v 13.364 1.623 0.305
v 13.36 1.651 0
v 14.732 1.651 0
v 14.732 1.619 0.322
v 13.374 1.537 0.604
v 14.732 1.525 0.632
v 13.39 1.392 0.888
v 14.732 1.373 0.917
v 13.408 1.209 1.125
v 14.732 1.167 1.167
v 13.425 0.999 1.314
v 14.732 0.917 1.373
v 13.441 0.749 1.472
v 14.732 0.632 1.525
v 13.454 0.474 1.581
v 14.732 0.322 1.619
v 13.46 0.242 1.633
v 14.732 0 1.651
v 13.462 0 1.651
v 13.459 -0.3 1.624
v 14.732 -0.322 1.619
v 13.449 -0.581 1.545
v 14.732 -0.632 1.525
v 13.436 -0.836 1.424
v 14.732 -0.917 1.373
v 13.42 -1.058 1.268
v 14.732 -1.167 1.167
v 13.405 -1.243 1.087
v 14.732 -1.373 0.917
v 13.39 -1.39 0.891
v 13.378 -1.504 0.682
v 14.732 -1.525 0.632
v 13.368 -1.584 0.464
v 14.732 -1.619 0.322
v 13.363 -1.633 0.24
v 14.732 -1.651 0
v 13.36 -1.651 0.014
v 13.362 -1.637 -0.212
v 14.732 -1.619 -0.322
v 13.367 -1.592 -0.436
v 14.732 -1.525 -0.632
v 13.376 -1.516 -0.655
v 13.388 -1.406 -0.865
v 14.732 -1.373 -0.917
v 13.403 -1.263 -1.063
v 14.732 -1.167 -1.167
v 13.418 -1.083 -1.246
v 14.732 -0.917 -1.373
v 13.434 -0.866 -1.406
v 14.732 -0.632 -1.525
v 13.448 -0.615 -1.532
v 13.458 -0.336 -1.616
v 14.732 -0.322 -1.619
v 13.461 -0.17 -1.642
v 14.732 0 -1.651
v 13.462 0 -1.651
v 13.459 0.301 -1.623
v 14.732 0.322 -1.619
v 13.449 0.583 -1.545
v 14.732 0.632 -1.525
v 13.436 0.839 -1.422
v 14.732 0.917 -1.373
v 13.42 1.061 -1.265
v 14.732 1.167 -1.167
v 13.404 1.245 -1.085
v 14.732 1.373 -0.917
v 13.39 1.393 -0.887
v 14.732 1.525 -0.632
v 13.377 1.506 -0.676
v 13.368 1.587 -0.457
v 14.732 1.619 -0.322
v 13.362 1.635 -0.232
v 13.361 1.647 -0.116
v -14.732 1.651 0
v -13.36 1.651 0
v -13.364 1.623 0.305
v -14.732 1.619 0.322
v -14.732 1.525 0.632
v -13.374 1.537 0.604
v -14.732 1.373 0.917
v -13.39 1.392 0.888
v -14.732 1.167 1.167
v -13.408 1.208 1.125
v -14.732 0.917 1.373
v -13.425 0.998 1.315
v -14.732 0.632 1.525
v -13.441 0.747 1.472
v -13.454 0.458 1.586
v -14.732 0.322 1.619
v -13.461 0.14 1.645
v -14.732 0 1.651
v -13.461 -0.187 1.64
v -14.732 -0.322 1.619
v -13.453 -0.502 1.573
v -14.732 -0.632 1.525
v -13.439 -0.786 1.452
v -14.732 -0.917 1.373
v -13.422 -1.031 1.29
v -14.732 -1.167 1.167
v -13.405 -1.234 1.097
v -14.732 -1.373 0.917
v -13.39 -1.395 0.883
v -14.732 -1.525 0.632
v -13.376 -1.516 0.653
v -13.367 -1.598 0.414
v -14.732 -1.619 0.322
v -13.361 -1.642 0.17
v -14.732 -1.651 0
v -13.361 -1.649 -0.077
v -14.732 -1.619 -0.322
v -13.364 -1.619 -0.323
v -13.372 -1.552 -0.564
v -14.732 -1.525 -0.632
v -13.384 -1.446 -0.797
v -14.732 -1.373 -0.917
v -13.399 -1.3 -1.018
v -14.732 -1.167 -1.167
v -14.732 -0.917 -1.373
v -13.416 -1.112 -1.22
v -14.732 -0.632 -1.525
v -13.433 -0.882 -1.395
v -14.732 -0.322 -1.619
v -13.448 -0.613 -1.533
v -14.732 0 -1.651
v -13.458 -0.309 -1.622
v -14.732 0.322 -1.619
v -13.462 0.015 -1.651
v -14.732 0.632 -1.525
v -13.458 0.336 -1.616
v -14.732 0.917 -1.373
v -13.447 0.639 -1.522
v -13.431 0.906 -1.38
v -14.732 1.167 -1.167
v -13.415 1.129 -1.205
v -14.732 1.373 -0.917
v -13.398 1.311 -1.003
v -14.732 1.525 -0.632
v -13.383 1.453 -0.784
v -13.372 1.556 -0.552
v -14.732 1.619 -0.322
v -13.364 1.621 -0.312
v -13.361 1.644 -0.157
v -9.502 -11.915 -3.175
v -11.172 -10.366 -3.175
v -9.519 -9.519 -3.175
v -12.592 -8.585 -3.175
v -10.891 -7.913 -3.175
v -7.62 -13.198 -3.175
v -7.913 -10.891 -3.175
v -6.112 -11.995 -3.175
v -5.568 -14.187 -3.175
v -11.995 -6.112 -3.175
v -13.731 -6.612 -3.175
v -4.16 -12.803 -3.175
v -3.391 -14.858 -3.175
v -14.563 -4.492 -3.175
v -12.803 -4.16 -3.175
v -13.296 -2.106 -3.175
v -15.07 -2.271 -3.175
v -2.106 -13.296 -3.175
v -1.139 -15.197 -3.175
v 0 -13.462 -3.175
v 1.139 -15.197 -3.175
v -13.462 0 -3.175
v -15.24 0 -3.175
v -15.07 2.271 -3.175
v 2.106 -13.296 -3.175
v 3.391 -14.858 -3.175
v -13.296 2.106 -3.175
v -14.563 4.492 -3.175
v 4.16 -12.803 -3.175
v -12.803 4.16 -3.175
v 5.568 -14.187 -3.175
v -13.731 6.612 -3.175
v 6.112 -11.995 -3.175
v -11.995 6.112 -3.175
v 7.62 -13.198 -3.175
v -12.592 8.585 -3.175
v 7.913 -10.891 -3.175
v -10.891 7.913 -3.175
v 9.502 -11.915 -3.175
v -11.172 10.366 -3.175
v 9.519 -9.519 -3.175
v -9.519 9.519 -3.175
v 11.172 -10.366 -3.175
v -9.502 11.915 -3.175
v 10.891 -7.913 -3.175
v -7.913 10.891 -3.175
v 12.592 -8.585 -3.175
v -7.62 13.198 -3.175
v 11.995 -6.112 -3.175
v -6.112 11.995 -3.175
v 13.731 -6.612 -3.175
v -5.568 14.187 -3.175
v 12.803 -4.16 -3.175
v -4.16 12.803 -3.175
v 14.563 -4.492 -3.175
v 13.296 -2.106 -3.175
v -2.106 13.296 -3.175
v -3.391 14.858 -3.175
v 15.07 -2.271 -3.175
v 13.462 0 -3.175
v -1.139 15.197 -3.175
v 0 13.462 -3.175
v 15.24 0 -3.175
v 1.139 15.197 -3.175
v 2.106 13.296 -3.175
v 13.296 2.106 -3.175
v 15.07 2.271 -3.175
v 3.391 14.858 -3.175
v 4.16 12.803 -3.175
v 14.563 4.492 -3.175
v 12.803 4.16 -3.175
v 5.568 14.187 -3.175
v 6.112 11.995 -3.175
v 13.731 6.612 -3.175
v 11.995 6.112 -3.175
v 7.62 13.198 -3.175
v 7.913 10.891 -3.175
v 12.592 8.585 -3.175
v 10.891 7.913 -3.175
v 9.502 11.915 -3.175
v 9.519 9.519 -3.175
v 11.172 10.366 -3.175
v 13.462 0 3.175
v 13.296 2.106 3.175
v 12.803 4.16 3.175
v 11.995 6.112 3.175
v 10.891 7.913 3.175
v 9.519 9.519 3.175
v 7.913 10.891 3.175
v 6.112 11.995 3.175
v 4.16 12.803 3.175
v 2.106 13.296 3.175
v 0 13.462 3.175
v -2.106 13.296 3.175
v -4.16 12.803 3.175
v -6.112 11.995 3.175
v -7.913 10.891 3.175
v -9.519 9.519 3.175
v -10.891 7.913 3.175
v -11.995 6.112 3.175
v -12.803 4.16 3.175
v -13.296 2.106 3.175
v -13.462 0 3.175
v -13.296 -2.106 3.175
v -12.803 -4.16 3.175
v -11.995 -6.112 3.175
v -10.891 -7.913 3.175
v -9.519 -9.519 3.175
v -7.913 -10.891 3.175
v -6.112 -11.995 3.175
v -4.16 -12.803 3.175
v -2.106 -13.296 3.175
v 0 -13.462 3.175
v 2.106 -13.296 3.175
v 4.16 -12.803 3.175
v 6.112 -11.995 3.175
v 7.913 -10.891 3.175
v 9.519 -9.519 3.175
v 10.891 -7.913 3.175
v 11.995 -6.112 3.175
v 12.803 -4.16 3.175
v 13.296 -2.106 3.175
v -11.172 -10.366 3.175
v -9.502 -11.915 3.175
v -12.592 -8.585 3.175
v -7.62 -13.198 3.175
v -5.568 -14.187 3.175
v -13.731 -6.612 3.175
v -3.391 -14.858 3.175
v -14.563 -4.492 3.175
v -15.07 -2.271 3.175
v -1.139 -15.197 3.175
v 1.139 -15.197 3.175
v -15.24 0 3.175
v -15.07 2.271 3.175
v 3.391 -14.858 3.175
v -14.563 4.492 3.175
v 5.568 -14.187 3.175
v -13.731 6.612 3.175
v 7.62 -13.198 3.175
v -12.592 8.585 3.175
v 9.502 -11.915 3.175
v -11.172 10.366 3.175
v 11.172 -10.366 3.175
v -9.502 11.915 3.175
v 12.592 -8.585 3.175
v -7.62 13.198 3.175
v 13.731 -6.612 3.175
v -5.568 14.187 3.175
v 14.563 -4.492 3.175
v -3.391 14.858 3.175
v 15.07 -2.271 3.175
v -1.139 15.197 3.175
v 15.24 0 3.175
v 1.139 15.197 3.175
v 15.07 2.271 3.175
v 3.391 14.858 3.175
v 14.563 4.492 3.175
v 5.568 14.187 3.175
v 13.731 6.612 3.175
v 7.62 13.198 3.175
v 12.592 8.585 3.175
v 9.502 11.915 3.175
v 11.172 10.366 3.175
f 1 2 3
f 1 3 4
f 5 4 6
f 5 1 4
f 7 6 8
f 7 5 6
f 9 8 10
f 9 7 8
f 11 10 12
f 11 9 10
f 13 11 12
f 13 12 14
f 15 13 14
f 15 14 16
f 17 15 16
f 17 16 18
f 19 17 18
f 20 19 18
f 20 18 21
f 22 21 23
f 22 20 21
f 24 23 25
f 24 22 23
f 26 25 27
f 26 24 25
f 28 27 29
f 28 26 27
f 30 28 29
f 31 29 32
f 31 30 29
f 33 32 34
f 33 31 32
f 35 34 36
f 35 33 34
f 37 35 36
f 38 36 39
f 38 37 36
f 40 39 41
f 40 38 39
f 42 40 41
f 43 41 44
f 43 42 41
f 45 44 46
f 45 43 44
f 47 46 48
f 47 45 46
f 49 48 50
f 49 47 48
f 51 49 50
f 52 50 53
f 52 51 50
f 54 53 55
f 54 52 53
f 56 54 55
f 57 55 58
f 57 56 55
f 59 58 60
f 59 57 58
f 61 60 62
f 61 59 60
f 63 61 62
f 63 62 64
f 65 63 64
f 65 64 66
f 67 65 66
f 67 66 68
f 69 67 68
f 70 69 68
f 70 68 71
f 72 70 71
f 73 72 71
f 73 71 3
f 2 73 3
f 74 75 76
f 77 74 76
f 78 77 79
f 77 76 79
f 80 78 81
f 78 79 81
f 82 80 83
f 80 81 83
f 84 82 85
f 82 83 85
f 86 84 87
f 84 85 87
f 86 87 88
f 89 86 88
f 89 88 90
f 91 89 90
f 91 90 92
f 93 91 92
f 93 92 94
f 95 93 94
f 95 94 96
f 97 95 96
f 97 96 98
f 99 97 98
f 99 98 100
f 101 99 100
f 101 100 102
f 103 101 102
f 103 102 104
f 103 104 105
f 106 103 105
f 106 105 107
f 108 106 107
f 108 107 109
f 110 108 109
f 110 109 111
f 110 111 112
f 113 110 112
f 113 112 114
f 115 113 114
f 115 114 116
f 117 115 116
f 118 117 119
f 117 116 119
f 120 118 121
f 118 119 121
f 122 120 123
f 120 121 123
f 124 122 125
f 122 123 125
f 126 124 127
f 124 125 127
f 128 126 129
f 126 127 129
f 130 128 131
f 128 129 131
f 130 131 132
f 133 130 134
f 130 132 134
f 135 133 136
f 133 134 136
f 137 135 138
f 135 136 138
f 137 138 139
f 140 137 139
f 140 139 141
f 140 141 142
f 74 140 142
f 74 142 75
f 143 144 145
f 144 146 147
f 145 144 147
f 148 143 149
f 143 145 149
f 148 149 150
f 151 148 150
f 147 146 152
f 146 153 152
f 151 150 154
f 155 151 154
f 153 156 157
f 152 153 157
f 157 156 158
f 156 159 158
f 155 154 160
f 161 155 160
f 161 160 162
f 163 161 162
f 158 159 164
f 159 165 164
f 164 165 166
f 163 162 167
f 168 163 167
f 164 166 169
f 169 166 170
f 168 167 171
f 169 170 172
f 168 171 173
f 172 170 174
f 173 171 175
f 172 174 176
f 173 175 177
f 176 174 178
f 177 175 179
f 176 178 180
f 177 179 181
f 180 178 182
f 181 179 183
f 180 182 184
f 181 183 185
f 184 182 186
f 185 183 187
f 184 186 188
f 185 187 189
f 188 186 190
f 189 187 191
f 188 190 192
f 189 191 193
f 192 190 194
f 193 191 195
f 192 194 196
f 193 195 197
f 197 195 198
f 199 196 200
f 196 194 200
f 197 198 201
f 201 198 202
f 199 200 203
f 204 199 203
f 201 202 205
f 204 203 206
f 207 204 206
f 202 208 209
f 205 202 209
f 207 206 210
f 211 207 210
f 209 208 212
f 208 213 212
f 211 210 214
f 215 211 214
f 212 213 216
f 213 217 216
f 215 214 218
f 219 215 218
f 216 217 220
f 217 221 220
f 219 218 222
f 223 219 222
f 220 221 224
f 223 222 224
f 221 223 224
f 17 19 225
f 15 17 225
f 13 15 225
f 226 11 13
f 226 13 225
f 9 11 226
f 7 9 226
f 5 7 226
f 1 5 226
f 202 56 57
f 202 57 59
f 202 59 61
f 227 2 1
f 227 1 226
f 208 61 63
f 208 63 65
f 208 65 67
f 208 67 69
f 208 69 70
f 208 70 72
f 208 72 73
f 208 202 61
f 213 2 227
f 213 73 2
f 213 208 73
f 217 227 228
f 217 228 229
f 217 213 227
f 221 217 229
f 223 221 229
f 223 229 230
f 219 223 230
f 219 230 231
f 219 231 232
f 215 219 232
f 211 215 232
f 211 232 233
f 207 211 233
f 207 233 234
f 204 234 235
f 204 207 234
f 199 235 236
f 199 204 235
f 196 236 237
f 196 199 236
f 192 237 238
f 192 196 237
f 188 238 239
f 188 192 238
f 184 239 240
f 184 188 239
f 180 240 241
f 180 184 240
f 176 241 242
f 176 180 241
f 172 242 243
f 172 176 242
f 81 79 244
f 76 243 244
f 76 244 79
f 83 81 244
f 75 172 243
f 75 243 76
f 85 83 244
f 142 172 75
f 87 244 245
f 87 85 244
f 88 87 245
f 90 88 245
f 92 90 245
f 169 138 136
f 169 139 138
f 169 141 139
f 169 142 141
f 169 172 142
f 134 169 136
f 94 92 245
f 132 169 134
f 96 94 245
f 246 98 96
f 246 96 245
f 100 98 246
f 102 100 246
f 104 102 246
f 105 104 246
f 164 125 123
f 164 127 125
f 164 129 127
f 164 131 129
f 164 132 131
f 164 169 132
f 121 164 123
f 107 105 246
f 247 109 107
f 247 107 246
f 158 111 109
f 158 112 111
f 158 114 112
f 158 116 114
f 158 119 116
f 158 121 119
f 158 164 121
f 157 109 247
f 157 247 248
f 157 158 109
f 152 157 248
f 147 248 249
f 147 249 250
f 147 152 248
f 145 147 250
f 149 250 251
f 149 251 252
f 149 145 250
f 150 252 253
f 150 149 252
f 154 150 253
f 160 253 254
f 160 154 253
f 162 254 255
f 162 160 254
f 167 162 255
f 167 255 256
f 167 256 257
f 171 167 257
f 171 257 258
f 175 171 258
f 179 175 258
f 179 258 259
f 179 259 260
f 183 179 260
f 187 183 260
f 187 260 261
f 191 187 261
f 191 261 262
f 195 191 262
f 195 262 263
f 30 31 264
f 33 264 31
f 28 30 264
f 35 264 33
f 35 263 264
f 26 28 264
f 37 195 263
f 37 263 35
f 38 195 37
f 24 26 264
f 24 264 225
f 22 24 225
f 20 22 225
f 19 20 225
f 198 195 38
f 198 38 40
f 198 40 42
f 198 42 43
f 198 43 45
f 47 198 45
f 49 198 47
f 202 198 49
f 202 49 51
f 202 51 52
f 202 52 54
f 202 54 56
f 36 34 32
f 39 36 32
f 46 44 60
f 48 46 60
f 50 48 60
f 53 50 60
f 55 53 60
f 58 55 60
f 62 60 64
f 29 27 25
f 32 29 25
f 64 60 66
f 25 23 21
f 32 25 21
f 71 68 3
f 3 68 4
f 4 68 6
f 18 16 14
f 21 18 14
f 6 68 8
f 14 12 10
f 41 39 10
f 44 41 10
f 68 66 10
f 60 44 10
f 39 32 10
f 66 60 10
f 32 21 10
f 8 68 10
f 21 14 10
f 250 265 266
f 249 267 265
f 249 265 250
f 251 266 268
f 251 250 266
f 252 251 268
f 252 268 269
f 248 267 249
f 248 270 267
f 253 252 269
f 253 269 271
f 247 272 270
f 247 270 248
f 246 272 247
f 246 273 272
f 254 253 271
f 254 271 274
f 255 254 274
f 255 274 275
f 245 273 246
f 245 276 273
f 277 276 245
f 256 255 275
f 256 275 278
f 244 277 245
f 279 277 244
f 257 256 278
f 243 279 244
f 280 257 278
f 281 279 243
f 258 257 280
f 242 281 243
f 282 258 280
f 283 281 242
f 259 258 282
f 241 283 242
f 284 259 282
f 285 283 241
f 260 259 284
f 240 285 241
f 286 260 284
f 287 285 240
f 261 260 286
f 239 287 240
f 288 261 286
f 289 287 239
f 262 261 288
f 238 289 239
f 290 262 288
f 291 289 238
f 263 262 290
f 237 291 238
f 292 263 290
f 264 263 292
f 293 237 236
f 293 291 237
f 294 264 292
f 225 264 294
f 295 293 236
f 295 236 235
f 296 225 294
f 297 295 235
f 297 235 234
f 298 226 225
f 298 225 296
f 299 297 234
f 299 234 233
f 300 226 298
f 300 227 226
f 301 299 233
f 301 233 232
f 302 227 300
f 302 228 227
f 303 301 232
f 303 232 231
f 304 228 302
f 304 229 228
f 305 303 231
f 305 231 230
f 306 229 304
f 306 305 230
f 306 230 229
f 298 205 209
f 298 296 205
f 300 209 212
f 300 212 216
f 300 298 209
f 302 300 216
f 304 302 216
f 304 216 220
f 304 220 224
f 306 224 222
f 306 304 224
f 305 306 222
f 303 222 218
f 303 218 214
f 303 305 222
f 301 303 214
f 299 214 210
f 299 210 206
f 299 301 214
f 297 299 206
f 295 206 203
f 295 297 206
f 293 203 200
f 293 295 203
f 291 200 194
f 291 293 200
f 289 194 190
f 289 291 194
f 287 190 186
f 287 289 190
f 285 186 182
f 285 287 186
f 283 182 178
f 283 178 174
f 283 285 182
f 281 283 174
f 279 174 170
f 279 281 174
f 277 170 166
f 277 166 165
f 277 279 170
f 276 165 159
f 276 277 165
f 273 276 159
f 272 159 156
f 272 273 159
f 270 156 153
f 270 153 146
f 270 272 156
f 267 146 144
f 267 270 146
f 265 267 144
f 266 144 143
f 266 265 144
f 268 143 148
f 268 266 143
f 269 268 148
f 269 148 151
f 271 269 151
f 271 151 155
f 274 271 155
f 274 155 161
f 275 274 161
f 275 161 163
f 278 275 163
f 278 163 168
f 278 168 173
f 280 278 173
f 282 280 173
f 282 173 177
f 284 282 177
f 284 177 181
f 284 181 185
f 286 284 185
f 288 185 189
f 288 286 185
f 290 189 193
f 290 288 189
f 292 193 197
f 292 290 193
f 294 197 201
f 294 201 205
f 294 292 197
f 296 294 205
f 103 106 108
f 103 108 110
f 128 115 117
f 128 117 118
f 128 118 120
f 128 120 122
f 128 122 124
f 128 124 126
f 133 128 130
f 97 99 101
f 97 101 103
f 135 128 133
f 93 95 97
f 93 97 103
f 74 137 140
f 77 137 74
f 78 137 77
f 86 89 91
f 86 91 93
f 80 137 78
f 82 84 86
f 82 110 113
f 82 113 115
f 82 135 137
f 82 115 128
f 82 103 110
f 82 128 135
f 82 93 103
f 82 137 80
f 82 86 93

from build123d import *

# Parameters (mm, degrees)
F0_R          = 15.24
F0_R_2        = 13.462
F1_DEPTH      = 3.175
F2_R          = 1.651
F3_DEPTH      = 14.732
F3_DEPTH_BACK = 14.732


with BuildPart() as f1:
    # F0 (on Top) → F1 (new body, symmetric)
    with BuildSketch(Plane.XY):
        Circle(F0_R)
        Circle(F0_R_2, mode=Mode.SUBTRACT)
    extrude(amount=F1_DEPTH, both=True)

    # F2 (on Right) → F3 (cut, two sides)
    with BuildSketch(Plane.YZ) as f3_sk:
        Circle(F2_R)
    extrude(amount=-F3_DEPTH, mode=Mode.SUBTRACT)
    extrude(f3_sk.sketch, amount=F3_DEPTH_BACK, mode=Mode.SUBTRACT)


solid = f1.part
